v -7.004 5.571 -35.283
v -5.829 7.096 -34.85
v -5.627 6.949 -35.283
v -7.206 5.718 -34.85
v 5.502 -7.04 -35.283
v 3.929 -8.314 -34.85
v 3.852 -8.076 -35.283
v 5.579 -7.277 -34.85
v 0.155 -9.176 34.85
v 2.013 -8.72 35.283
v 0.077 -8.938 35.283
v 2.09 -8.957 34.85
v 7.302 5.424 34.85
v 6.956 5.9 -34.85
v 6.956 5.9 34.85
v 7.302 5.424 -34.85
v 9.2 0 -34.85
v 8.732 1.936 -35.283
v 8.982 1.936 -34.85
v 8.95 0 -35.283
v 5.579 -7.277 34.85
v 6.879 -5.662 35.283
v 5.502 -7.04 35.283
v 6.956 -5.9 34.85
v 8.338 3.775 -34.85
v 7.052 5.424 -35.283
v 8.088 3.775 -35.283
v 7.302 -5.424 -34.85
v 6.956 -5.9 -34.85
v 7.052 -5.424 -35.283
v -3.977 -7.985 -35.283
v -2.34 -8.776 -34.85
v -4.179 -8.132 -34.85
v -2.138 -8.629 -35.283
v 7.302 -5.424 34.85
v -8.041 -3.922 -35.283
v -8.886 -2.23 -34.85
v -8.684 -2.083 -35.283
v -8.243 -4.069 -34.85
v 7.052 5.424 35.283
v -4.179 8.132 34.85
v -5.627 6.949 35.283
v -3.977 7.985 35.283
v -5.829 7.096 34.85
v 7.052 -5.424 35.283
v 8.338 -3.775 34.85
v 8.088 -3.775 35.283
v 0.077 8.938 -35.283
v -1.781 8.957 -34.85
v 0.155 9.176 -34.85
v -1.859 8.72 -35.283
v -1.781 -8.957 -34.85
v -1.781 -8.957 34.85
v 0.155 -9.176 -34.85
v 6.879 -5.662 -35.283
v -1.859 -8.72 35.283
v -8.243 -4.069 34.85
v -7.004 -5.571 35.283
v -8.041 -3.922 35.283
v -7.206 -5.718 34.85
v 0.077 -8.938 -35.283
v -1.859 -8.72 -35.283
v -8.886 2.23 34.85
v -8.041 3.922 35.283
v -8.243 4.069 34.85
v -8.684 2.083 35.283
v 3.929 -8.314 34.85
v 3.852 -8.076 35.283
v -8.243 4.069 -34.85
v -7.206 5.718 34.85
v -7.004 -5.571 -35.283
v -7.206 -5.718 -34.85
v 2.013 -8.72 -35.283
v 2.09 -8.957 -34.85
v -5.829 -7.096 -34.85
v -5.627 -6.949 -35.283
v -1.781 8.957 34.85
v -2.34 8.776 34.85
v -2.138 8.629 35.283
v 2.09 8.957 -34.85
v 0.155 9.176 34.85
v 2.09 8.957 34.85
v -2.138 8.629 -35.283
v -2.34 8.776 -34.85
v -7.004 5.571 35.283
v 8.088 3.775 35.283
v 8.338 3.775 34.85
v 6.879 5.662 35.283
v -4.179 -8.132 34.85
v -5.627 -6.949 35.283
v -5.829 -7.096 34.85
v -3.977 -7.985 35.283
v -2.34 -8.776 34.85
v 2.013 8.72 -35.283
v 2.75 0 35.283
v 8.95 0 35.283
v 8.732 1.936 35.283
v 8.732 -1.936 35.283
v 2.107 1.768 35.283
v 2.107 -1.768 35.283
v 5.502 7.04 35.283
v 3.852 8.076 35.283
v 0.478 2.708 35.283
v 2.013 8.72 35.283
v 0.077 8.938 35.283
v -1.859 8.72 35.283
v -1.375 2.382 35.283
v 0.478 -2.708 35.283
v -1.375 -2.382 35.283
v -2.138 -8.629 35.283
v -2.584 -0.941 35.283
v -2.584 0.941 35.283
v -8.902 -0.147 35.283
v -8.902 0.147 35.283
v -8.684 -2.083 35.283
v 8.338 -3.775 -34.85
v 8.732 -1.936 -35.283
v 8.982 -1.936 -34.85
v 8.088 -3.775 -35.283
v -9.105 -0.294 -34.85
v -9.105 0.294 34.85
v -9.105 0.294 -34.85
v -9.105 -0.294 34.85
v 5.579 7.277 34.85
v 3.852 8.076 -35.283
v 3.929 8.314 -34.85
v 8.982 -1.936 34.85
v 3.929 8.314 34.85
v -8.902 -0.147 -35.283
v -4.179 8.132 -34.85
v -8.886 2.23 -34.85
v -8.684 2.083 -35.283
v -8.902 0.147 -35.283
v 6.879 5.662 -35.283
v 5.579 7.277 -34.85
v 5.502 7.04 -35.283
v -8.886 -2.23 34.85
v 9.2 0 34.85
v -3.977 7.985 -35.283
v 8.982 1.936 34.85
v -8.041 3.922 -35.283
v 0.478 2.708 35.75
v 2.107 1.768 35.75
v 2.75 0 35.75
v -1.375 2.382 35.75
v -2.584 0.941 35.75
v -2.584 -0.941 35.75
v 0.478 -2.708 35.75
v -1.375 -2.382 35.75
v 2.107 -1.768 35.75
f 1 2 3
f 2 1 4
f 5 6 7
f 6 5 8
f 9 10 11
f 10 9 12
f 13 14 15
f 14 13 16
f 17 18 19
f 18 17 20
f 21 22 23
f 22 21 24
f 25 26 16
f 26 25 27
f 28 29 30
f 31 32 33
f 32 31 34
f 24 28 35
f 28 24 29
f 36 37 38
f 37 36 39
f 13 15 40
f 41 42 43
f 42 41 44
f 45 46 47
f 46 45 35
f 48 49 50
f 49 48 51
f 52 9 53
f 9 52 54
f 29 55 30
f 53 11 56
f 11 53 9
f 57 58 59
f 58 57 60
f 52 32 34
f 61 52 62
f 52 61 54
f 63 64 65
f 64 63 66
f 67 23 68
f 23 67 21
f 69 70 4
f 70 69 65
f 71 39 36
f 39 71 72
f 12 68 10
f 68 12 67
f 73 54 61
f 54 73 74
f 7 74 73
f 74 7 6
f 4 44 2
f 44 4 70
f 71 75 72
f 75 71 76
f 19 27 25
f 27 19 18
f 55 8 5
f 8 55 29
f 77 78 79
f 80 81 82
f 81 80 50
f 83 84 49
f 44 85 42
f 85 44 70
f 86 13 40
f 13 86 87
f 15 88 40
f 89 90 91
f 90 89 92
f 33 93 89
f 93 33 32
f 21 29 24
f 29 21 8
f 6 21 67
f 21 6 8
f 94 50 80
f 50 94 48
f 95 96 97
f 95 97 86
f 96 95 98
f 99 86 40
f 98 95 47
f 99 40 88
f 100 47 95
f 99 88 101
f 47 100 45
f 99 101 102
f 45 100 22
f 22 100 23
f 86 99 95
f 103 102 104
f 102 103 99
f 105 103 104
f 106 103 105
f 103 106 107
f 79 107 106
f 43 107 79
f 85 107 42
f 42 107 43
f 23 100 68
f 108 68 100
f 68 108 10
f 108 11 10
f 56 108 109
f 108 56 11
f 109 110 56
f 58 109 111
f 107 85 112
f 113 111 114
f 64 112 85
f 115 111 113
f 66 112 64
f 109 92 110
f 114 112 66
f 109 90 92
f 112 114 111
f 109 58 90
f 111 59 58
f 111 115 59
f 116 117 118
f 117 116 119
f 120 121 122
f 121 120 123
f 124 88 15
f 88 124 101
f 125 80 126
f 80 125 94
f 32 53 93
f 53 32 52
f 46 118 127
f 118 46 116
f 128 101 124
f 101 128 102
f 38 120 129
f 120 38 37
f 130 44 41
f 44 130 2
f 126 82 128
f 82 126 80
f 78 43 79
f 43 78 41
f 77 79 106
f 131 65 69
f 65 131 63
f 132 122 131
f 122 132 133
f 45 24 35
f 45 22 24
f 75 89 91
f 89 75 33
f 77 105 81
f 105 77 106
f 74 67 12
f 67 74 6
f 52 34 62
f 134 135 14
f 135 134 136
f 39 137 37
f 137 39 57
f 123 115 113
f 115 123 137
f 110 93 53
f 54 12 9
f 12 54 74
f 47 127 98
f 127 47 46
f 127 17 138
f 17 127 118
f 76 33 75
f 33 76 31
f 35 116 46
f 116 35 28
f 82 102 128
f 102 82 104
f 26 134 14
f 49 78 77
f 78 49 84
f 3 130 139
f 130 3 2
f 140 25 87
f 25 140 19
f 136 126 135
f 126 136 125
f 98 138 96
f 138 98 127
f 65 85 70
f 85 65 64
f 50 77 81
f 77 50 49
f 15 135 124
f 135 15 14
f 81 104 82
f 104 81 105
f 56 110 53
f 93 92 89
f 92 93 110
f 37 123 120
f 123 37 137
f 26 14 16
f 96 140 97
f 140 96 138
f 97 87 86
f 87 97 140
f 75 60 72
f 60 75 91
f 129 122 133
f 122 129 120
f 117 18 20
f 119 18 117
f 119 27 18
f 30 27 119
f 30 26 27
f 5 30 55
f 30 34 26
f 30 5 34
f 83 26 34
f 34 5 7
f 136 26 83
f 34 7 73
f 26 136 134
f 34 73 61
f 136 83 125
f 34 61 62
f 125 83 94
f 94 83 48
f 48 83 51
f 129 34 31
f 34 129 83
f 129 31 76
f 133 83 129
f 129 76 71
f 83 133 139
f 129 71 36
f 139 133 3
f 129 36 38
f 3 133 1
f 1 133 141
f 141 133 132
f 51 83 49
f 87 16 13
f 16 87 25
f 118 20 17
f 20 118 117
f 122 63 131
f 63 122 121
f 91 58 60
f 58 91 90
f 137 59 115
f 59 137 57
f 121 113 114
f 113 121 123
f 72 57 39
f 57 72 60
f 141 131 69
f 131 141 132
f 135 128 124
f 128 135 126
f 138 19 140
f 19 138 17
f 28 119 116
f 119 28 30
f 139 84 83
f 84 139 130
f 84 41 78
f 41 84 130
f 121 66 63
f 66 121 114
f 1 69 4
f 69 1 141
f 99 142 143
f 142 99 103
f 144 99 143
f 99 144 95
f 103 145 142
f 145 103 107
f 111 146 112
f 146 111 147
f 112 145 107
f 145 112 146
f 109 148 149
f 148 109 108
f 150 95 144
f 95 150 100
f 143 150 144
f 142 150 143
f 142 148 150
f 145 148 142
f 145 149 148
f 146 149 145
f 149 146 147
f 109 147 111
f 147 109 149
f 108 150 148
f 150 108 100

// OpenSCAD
// Parameters
cell_height_mm = 70.7; //[35.35:141.4:0.1]
cell_diameter_mm = 18.4; //[9.2:36.8:0.1]
positive_button_diameter_mm = 5.5; //[2.75:11:0.1]
positive_button_height_mm = 1.2; //[0.6:2.4:0.1]
negative_end_recess_mm = 0; //[0:2:0.1]
edge_fillet_radius_mm = 0.5; //[0:2:0.1]
connect_overlap_mm = 0.8; //[0.2:2:0.1]
recess_diameter_factor = 0.7; //[0.3:0.95:0.05]

// Battery - complete geometry
module battery() {
  color("Silver") {
    // Cylindrical cell body with edge fillet
    difference() {
      // Main body with fillet
      minkowski() {
        cylinder(h=cell_height_mm - 2*edge_fillet_radius_mm, 
                 r=cell_diameter_mm/2 - edge_fillet_radius_mm, center=true);
        sphere(r=edge_fillet_radius_mm, center=true);
      }
      // Negative end recess
      if (negative_end_recess_mm > 0) {
        translate([0, 0, -cell_height_mm/2 + negative_end_recess_mm/2])
          cylinder(h=negative_end_recess_mm, 
                   r=(cell_diameter_mm * recess_diameter_factor) / 2, center=true);
      }
    }
    
    // Positive terminal button
    translate([0, 0, cell_height_mm/2 + positive_button_height_mm/2 - connect_overlap_mm])
      cylinder(h=positive_button_height_mm, 
               r=positive_button_diameter_mm/2, center=true);
  }
}

// Assembly
module assembly() {
  battery();
}

assembly();
